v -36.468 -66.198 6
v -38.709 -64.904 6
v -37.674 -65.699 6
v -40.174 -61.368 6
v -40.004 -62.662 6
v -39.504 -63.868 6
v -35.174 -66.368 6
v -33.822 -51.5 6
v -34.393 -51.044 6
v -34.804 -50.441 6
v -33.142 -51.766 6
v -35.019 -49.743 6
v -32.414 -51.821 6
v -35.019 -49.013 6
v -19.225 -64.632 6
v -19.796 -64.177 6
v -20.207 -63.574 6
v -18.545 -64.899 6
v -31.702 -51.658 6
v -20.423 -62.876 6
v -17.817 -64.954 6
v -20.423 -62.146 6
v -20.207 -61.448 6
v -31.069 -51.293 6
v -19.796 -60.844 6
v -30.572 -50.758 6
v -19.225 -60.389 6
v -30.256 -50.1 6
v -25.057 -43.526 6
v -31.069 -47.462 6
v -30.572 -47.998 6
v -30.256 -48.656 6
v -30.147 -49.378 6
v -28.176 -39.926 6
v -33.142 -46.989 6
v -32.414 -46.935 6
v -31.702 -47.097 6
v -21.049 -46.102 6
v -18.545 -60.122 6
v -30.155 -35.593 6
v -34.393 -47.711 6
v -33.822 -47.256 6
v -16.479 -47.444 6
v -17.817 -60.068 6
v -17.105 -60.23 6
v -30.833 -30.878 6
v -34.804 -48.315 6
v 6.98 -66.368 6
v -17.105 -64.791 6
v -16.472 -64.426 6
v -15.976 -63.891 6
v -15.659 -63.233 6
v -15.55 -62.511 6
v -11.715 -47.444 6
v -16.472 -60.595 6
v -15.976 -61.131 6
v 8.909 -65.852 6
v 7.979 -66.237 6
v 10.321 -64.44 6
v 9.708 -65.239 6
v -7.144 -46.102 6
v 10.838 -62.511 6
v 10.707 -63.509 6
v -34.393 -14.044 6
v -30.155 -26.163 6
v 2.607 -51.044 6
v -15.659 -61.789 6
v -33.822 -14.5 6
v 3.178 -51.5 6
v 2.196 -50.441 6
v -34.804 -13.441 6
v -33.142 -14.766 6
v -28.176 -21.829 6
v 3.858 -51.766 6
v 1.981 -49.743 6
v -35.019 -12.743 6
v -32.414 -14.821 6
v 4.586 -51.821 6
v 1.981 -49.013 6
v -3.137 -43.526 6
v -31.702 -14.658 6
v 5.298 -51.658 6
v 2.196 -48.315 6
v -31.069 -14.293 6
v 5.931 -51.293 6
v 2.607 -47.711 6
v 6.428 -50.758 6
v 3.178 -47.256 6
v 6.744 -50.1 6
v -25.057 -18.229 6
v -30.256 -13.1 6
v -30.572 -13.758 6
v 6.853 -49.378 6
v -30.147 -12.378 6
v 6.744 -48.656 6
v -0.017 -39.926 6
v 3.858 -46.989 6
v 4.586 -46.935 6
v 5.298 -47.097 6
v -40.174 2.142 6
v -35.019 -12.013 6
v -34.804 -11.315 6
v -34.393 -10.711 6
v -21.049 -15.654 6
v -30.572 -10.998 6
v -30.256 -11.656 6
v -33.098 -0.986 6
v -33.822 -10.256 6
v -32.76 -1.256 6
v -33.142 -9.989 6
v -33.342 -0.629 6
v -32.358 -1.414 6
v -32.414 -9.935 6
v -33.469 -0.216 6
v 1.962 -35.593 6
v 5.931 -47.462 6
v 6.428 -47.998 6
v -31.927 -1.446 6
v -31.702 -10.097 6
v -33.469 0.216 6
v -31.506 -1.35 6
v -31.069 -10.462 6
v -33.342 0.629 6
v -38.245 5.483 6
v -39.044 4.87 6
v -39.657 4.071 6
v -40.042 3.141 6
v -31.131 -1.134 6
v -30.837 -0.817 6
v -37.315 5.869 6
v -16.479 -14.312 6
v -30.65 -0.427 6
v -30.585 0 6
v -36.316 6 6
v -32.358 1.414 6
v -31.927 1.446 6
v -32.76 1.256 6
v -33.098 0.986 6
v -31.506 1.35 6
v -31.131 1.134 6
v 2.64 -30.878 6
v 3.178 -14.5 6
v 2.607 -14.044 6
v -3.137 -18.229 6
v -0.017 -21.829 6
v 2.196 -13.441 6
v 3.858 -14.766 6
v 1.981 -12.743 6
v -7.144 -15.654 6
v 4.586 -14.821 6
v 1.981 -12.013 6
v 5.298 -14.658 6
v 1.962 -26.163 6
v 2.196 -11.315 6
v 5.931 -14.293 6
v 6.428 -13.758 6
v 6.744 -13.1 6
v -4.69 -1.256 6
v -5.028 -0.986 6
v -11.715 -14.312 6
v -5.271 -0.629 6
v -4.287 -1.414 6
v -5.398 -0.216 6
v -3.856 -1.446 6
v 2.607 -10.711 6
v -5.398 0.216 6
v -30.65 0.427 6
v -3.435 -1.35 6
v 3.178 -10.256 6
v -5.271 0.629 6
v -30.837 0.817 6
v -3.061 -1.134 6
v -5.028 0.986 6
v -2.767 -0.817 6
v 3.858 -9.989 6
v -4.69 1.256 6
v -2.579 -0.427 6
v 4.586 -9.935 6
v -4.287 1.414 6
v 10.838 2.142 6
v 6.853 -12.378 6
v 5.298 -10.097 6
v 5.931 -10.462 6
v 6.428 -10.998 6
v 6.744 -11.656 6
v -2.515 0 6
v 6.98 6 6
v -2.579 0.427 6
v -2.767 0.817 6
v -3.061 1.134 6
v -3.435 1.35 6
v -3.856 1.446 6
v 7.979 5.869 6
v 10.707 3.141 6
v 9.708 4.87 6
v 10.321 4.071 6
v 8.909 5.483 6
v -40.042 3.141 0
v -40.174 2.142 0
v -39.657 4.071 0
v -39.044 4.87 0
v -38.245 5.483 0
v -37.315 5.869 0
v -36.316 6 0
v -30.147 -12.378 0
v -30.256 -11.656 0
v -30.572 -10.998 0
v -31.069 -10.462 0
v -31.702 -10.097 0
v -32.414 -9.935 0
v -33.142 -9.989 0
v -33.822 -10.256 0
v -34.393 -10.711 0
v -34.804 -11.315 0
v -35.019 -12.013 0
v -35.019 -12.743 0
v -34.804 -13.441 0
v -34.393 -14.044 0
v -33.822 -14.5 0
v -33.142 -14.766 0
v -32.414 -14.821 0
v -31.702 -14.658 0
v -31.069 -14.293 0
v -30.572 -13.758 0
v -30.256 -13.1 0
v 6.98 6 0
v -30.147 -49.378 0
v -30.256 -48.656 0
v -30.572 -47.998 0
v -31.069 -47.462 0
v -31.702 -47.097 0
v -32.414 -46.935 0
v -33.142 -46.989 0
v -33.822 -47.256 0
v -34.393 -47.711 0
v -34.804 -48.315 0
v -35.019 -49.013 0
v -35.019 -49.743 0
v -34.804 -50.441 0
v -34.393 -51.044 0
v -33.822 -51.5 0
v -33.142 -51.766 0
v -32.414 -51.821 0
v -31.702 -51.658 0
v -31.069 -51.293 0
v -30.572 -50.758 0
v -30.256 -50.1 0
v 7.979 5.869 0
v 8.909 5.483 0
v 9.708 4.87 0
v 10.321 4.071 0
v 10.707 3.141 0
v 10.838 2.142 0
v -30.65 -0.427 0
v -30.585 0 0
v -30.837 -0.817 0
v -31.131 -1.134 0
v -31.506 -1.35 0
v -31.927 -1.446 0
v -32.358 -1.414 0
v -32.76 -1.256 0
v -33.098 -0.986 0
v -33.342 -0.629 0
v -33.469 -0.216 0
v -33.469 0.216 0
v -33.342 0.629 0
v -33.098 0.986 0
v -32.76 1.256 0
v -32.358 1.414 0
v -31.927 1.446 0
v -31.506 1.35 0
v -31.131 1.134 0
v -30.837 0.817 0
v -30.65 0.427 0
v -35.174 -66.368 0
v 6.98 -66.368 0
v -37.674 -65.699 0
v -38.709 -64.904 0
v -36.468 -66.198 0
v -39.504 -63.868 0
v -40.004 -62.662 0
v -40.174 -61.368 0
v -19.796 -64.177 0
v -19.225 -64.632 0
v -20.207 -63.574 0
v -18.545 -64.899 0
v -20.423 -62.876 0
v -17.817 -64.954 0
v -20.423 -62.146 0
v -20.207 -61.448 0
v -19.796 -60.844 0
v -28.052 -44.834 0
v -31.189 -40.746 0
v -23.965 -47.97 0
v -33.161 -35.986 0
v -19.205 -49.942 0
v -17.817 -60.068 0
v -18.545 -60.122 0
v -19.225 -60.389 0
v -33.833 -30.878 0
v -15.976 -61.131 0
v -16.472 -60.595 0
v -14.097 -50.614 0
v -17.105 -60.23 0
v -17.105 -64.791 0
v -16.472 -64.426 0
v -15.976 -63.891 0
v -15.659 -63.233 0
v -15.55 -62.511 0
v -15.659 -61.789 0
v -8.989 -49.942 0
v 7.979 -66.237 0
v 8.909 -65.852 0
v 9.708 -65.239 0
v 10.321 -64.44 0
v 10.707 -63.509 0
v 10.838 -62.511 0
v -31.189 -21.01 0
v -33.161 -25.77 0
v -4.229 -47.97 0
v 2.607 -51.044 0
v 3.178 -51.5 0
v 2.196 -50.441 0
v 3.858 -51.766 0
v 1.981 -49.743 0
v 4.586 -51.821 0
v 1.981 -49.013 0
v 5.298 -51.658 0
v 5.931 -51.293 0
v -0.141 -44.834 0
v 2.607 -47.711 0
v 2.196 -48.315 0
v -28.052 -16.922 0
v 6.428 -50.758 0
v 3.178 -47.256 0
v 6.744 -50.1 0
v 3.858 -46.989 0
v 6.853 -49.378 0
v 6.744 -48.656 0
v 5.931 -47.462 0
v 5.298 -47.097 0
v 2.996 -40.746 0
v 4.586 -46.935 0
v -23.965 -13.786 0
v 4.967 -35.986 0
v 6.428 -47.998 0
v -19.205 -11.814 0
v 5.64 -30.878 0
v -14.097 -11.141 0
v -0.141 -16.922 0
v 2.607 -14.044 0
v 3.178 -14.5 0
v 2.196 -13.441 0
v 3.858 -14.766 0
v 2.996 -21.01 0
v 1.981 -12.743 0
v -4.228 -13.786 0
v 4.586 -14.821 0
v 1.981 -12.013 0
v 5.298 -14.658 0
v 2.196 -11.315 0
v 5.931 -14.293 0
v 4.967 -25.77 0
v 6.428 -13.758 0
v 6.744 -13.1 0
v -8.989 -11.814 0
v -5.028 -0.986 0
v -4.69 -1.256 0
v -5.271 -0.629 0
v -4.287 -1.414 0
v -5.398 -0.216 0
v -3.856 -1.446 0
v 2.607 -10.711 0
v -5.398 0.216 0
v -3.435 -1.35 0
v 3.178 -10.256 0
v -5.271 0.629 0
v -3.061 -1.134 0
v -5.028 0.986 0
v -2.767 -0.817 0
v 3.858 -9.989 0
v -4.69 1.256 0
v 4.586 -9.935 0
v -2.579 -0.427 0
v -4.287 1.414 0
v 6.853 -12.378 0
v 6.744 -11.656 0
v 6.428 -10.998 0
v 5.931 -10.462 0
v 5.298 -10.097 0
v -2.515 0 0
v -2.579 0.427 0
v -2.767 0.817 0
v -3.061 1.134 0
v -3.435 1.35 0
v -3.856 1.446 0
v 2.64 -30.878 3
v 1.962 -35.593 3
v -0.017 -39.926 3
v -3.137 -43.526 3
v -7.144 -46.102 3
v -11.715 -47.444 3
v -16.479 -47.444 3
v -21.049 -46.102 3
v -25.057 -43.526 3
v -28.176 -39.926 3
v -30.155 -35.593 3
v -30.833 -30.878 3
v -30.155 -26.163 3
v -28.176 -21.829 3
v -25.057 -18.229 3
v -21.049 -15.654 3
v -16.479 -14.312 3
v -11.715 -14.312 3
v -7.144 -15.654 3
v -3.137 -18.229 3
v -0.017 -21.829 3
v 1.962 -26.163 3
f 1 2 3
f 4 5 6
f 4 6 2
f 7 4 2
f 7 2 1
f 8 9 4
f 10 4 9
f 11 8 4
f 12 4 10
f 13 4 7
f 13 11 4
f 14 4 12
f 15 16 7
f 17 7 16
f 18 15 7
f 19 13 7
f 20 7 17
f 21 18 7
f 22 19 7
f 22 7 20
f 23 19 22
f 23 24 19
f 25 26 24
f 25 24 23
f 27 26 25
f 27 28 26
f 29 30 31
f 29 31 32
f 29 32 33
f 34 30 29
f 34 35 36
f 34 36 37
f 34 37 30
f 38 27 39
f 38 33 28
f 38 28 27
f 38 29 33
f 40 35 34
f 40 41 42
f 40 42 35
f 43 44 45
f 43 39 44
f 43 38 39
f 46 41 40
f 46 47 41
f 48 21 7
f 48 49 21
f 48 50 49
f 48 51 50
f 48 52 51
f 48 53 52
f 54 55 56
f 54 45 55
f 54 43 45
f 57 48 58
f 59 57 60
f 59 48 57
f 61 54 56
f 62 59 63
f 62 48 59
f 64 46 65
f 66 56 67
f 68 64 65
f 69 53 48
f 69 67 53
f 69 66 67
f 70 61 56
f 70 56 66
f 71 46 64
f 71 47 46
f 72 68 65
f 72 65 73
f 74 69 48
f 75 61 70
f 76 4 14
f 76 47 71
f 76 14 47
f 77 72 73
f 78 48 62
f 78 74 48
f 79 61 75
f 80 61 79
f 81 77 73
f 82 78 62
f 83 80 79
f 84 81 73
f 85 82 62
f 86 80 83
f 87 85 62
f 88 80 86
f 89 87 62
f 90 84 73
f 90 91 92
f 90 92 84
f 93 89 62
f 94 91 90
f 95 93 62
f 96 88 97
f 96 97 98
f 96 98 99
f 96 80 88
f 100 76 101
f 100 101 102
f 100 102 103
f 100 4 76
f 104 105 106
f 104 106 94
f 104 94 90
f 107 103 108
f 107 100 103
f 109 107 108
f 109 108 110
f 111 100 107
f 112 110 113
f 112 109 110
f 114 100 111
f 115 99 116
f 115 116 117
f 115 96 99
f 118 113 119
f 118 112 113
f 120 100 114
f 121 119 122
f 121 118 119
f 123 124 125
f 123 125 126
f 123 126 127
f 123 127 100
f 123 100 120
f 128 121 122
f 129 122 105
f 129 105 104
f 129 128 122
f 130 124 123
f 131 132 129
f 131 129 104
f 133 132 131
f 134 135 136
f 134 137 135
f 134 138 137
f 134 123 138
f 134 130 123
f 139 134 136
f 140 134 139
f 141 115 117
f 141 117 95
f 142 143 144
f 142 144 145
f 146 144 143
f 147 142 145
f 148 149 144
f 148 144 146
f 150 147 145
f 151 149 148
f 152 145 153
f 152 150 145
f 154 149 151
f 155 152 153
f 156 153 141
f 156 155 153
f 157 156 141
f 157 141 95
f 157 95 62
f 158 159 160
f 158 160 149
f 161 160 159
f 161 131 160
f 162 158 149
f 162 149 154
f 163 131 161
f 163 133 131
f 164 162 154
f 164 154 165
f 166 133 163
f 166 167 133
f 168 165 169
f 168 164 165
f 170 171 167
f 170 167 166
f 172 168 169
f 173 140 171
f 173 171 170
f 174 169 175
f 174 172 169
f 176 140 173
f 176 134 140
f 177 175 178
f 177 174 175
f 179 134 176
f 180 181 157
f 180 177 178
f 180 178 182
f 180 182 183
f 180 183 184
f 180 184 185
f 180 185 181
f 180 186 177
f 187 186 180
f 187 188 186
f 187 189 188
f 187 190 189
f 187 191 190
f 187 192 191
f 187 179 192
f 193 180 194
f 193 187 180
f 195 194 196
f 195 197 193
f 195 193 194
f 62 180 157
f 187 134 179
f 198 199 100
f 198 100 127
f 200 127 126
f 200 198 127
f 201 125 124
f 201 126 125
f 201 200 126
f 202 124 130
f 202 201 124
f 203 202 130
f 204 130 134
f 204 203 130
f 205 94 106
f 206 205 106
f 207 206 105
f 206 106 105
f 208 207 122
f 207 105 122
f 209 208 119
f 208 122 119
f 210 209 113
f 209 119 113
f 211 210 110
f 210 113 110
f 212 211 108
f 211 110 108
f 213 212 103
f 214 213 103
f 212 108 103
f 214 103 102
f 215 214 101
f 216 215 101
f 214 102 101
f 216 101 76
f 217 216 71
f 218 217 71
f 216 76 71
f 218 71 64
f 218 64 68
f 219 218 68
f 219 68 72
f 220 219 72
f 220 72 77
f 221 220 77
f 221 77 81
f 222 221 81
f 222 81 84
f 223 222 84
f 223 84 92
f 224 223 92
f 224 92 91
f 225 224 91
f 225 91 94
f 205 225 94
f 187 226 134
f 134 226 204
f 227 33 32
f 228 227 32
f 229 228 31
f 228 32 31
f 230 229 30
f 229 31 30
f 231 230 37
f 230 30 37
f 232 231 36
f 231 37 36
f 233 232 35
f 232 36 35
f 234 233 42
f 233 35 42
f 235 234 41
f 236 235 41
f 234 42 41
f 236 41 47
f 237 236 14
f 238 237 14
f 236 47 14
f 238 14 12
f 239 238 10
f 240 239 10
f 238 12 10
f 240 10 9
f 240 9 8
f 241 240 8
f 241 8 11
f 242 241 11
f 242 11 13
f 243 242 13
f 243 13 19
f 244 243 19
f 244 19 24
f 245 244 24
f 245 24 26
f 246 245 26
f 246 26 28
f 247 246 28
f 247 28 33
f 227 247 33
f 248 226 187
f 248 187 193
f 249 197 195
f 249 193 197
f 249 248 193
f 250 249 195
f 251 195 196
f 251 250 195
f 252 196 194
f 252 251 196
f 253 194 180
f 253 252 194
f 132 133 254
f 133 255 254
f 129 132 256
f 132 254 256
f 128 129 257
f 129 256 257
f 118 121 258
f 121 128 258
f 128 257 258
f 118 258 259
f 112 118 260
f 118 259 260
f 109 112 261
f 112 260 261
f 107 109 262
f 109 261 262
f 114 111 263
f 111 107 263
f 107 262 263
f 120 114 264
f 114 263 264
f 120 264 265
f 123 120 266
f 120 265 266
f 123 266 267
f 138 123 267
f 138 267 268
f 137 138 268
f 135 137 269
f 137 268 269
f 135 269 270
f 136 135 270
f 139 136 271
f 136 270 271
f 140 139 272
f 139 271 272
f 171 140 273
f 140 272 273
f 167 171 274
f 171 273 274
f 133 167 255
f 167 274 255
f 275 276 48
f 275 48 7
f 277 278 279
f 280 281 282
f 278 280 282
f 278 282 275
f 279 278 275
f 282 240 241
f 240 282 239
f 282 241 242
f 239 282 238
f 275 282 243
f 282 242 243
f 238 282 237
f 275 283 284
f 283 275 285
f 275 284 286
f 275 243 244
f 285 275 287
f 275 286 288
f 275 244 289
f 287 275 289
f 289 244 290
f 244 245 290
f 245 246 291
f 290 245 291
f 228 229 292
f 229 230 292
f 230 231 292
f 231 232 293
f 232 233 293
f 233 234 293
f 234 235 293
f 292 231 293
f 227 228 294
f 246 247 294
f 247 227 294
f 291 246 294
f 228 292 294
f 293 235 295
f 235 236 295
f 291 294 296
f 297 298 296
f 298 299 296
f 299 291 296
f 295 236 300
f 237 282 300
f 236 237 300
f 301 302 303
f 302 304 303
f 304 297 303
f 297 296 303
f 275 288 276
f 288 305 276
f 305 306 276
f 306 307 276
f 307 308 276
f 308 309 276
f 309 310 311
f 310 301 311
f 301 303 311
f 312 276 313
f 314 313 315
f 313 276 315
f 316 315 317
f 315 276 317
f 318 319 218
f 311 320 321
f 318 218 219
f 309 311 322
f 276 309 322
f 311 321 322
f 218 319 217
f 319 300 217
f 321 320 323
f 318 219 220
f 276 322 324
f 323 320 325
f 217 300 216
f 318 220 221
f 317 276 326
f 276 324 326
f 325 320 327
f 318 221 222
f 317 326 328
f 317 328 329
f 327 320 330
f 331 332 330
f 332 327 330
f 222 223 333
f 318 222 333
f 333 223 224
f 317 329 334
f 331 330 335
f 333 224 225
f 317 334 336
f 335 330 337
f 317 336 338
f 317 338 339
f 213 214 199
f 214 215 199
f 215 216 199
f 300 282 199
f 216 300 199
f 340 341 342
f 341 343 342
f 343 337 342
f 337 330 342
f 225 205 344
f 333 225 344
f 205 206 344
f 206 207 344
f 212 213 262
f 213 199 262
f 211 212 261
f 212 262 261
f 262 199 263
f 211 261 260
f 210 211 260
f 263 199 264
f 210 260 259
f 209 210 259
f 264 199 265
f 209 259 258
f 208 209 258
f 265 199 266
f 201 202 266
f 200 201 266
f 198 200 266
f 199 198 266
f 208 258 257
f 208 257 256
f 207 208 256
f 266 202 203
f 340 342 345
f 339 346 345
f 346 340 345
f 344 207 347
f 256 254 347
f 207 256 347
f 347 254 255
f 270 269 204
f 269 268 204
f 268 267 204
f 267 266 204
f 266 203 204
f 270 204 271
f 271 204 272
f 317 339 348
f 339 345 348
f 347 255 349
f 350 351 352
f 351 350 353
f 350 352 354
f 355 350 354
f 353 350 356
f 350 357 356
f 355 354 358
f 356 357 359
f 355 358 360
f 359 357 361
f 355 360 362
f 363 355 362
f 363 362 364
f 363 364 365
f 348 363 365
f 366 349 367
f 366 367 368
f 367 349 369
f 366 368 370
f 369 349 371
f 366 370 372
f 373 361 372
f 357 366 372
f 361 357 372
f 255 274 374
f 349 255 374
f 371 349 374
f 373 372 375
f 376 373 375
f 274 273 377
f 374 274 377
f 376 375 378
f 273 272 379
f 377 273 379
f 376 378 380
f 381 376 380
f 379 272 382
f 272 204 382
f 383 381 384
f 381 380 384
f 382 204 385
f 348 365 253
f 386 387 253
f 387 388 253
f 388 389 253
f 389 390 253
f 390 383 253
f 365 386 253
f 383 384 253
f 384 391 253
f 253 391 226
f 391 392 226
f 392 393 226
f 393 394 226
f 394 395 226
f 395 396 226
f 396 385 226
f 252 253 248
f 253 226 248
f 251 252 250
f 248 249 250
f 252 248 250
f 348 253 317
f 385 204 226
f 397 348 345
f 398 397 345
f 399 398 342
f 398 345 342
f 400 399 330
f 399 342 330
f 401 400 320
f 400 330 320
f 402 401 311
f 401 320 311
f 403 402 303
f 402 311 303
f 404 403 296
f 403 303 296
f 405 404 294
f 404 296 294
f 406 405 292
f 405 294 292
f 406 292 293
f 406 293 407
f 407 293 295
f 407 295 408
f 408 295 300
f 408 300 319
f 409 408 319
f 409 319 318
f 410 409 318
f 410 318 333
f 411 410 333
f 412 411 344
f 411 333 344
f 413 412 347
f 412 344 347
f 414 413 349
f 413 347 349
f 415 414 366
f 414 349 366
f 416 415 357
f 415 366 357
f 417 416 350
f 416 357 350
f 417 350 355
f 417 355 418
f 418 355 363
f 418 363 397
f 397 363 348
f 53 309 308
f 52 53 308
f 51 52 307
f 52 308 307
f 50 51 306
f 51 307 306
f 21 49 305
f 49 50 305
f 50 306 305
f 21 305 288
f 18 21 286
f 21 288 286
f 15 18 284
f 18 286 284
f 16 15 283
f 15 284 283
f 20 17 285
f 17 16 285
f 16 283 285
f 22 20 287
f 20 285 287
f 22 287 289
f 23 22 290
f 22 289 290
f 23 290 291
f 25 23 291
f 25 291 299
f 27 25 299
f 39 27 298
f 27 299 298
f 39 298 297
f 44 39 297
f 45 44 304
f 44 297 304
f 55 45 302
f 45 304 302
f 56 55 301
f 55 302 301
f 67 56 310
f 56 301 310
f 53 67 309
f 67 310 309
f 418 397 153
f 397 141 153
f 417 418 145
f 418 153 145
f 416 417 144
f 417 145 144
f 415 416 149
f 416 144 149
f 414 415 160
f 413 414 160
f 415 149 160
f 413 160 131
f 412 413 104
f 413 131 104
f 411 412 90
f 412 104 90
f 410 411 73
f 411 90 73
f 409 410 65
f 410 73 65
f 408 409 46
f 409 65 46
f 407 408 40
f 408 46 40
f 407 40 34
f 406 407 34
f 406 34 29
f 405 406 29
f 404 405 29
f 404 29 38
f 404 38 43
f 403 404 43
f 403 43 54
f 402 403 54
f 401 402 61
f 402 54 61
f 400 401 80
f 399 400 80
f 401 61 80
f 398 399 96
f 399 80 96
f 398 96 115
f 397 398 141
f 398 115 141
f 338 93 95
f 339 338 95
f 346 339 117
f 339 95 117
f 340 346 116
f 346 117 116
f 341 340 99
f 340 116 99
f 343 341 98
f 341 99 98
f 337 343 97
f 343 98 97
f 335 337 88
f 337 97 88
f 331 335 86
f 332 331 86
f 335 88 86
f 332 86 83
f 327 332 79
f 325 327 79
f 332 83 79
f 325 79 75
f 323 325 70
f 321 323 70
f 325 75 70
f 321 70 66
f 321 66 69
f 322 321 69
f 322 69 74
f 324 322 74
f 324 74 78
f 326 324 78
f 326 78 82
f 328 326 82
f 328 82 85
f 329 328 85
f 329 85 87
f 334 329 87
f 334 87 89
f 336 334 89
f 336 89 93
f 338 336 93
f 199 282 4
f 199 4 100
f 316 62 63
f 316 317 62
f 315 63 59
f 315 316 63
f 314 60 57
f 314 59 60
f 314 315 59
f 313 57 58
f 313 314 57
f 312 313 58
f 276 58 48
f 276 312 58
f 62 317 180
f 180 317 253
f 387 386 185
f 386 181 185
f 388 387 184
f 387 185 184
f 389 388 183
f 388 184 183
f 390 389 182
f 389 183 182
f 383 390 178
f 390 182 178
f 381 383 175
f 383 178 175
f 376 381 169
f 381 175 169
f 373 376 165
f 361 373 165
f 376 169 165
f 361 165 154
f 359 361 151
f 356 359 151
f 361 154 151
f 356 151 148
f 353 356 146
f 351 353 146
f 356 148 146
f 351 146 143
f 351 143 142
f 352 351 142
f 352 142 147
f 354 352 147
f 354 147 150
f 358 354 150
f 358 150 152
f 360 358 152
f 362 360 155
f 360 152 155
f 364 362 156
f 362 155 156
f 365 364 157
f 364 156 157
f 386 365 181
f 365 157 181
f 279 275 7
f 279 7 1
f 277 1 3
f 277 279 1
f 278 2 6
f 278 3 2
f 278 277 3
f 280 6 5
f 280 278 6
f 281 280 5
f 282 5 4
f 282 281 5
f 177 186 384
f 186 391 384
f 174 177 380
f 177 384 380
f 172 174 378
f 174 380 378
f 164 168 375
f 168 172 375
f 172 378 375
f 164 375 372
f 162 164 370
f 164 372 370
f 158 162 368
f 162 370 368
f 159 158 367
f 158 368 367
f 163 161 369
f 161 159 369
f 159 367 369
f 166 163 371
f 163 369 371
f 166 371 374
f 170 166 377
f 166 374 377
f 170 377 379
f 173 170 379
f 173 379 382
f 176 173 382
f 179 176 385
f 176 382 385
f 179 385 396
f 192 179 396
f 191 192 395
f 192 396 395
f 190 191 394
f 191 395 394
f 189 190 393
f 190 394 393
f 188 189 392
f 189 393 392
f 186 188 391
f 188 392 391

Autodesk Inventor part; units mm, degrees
ref_plane "YZ Plane" through (0, 0, 0) normal (1, 0, 0) x (0, 1, 0)
ref_plane "XZ Plane" through (0, 0, 0) normal (0, 1, 0) x (-1, 0, 0)
ref_plane "XY Plane" through (0, 0, 0) normal (0, 0, 1) x (1, 0, 0)
ref_plane "Work Plane1" through (0, 0, 0) normal (0, 0, 1) x (1, 0, 0)
sketch "Sketch1" plane through (0, 0, 0) normal (0, 0, 1) x (1, 0, 0)
  line L0 (10.8382, -62.5107) -> (10.8382, 0.6668)
  line L1 (6.9805, -66.3684) -> (-18, -66.3684)
  line L2 (10.8382, -5.7047) -> (9.6808, -5.7047) construction
  line L3 (10.8382, 0.6668) -> (10.8382, 2.1422)
  line L4 (-40.1739, 0.853) -> (-40.1739, 2.1422)
  line L5 (6.9805, 6) -> (-36.3161, 6)
  circle A0 centre (-3.9646, 0) radius 1.45
  circle A1 centre (-32.0354, 0) radius 1.45
  circle A2 centre (-18, -62.5107) radius 2.45
  arc A3 (-20.665, -65.3) -> (-18, -66.3684) centre (-18, -62.5107) ccw
  arc A4 (6.9805, -66.3684) -> (10.8382, -62.5107) centre (6.9805, -62.5107) ccw
  arc A5 (-36.3161, 6) -> (-40.1739, 2.1422) centre (-36.3161, 2.1422) ccw
  arc A6 (10.8382, 2.1422) -> (6.9805, 6) centre (6.9805, 2.1422) ccw
  line L6 (-18, -66.3684) -> (-35.1739, -66.3684)
  line L7 (-40.1739, -61.3684) -> (-40.1739, 0.853)
  arc A7 (-40.1739, -61.3684) -> (-35.1739, -66.3684) centre (-35.1739, -61.3684) ccw
  point P0 (0, 0)
  point P1 (10.8382, 6)
  point P2 (-40.1739, 6)
  dimension "d6" = 2.9
  dimension "d7" = 2.9
  dimension "d32" = 90
  dimension "d46" = 5
  dimension "d47" = 62.5107
  dimension "d48" = 28.0709
  dimension "d49" = 64.067
extrude "Extrusion1" add sketch "Sketch1" along normal blind 6
sketch "Sketch8" plane through (0, 0, 6) normal (0, 0, 1) x (1, 0, 0)
  circle A0 centre (-18, -62.5107) radius 2.45 projected
  circle A1 centre (-32.0354, 0) radius 1.45 projected
  circle A2 centre (-3.9646, 0) radius 1.45 projected
  line L0 (-35.1739, -66.3684) -> (6.9805, -66.3684) projected
  arc A3 (6.9805, -66.3684) -> (10.8382, -62.5107) centre (6.9805, -62.5107) ccw projected
  line L1 (10.8382, -62.5107) -> (10.8382, 2.1422) projected
  arc A4 (10.8382, 2.1422) -> (6.9805, 6) centre (6.9805, 2.1422) ccw projected
  line L2 (6.9805, 6) -> (-36.3161, 6) projected
  arc A5 (-36.3161, 6) -> (-40.1739, 2.1422) centre (-36.3161, 2.1422) ccw projected
  line L3 (-40.1739, 2.1422) -> (-40.1739, -61.3684) projected
  arc A6 (-40.1739, -61.3684) -> (-35.1739, -66.3684) centre (-35.1739, -61.3684) ccw projected
  circle A7 centre (-14.0967, -30.8778) radius 16.7364
  line L4 (4.4033, -49.3778) -> (-32.5967, -49.3778)
  line L5 (-32.5967, -49.3778) -> (-32.5967, -12.3778)
  line L6 (-32.5967, -12.3778) -> (4.4033, -12.3778)
  line L7 (4.4033, -12.3778) -> (4.4033, -49.3778)
  line L8 (4.4033, -49.3778) -> (-32.5967, -12.3778) construction
  line L9 (-32.5967, -49.3778) -> (4.4033, -12.3778) construction
  circle A8 centre (-32.5967, -12.3778) radius 2.45
  circle A9 centre (4.4033, -12.3778) radius 2.45
  circle A10 centre (4.4033, -49.3778) radius 2.45
  circle A11 centre (-32.5967, -49.3778) radius 2.45
  point P0 (0, 0)
  dimension "d52" = 37
  dimension "d53" = 37
  dimension "d54" = 4.9
  dimension "d55" = 4.9
  dimension "d56" = 4.9
  dimension "d57" = 4.9
extrude "Extrusion7" cut sketch "Sketch8" against normal through all contours A7 | A11 L5 L4 | L4 L5 A11 | A10 L7 L4 | L4 L7 A10 | A8 L6 L5 | L5 L6 A8 | A9 L6 L7 | L7 L6 A9
chamfer "Chamfer3" distance 3 angle 45 1 edges at (-30.8332, -30.8778, 0)
properties part number "cellSTORM_inverted_chiptray_v0"
